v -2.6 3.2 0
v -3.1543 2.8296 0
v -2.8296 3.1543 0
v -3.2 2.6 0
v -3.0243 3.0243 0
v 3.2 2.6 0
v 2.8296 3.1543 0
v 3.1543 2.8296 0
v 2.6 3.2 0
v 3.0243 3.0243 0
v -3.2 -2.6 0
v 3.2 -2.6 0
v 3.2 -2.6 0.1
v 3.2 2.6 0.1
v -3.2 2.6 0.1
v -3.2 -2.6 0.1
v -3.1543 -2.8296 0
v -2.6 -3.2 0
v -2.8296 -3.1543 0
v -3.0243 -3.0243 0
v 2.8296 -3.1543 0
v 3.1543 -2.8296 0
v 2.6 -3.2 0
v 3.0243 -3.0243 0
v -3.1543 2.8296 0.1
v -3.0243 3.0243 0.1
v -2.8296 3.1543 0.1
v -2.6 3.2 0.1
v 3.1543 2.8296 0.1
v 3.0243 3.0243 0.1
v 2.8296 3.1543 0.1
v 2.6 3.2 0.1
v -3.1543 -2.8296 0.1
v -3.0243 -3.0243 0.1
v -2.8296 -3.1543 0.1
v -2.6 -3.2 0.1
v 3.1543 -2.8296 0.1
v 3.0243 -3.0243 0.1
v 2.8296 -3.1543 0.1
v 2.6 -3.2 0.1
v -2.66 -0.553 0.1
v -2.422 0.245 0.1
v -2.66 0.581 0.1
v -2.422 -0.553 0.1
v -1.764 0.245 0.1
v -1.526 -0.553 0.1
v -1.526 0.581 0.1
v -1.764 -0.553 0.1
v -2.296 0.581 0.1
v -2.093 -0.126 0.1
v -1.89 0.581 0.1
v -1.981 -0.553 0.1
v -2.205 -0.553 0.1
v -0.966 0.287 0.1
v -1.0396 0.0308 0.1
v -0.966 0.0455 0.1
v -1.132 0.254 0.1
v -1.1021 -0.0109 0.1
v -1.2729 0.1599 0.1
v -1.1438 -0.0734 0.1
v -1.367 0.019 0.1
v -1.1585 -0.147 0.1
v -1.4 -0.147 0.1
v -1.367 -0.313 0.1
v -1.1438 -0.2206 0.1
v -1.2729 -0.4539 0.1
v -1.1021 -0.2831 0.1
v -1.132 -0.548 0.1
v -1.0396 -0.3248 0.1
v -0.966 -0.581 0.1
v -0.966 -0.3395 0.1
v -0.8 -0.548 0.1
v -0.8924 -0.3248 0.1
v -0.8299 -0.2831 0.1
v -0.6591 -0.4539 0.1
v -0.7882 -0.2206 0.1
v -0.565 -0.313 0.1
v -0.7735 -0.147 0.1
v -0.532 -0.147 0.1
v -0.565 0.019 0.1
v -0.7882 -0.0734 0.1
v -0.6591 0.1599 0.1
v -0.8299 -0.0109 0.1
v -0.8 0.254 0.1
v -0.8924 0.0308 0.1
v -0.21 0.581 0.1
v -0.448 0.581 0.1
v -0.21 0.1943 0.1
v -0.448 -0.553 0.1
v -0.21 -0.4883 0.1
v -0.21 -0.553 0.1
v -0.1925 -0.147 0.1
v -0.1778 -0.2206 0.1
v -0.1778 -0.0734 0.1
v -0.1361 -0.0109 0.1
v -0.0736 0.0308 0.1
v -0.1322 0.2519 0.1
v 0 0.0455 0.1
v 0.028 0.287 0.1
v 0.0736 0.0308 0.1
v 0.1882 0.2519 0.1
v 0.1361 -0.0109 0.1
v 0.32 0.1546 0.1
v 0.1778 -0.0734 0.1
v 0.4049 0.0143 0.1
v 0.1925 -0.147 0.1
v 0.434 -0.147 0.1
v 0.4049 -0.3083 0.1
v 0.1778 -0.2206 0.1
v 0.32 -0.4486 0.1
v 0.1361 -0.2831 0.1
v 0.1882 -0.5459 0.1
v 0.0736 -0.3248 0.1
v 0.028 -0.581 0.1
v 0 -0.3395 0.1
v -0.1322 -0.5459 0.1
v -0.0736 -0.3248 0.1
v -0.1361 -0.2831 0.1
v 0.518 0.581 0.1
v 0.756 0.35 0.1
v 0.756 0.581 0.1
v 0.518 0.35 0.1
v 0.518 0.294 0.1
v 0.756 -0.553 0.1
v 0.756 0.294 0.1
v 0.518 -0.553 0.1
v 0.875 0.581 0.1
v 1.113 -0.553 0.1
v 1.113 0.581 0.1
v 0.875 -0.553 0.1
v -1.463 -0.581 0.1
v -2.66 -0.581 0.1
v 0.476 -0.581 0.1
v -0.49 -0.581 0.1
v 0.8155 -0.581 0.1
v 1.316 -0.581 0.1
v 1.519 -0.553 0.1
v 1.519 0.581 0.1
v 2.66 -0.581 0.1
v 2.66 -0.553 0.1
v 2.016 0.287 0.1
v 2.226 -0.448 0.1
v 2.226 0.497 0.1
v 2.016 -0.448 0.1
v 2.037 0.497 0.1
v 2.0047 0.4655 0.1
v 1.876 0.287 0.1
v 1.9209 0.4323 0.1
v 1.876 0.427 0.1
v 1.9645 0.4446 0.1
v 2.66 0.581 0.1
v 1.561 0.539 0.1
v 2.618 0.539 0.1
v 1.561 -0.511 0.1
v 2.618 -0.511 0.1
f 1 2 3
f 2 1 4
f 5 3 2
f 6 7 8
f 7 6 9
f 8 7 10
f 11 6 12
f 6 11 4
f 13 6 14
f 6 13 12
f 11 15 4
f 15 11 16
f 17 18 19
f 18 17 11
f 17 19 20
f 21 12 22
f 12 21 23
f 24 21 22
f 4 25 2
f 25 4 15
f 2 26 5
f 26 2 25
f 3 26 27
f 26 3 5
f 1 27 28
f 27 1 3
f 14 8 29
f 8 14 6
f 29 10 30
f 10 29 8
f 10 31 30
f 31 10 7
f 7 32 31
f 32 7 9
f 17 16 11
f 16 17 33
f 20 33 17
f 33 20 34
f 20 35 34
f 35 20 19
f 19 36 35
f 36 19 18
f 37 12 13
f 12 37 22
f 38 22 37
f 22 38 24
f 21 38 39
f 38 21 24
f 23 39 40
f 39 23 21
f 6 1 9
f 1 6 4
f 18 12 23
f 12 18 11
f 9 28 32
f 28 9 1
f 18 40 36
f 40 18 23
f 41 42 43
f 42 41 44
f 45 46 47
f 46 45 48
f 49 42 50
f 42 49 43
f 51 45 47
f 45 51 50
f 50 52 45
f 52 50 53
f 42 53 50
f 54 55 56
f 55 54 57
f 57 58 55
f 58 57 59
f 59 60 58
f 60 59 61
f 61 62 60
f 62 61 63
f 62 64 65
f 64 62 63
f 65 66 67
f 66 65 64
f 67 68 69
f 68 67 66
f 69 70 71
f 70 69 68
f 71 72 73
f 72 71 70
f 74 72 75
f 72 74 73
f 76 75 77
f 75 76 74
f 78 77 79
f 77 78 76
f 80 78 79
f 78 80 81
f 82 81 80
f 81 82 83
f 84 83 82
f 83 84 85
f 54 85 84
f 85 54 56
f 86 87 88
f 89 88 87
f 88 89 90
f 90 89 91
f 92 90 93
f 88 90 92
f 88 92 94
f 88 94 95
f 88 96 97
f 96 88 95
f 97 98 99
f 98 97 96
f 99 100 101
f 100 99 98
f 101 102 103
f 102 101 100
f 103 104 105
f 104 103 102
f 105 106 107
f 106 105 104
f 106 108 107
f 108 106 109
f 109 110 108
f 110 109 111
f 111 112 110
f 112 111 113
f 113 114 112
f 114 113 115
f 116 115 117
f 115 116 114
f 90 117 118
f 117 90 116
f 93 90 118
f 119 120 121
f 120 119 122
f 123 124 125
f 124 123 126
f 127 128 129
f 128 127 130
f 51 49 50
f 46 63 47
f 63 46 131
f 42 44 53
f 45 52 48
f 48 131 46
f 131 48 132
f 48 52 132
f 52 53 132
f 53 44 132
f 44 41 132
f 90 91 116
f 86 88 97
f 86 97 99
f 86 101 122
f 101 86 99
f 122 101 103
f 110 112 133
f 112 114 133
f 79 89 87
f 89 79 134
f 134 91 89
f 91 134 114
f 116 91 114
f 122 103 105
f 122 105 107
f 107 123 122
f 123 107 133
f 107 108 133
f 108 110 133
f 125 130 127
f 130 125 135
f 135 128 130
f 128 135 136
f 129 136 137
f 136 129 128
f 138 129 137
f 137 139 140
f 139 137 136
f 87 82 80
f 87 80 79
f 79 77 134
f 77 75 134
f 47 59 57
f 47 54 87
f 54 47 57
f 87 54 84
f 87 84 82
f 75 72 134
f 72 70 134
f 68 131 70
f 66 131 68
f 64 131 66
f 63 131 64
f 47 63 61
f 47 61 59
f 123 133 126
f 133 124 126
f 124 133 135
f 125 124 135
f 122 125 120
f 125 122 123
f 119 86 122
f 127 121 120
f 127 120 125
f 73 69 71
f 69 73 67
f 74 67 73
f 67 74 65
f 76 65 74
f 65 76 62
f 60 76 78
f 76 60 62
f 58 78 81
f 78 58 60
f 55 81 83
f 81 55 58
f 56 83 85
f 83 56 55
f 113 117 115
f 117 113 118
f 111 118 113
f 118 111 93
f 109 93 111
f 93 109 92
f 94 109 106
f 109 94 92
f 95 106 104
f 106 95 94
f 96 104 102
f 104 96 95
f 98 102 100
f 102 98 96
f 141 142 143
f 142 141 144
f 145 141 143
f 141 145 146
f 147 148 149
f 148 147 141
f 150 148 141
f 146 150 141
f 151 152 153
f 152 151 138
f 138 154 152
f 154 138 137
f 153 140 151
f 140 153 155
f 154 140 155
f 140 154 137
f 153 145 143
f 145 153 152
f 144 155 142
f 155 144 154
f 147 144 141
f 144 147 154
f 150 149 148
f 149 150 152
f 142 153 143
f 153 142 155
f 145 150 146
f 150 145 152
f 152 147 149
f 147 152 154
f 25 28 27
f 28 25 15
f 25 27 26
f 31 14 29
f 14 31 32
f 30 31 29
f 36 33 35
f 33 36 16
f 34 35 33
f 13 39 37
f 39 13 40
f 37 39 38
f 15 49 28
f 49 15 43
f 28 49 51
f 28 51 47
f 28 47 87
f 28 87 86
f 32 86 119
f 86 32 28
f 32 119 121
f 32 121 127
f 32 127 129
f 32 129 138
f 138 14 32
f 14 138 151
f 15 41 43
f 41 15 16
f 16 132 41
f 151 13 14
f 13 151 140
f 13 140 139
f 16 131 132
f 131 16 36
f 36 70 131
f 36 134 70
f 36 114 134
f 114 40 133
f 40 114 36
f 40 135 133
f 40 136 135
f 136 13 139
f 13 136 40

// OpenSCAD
// file: ../p/box3u12.scad
use <../lib.scad>
function ldraw_lib__box3u12() = [
// 0 Box with 3 Parallel Faces without Any Edges
// 0 Name: box3u12.dat
// 0 Author: J.C. Tchang [tchang]
// 0 !LDRAW_ORG Primitive UPDATE 2014-02
// 0 !LICENSE Licensed under CC BY 4.0 : see CAreadme.txt
// 
// 0 BFC CERTIFY CCW
  [0,"BFC","CERTIFY"],
  [0,"BFC","CCW"],
// 
// 0 !HISTORY 2014-12-23 [PTadmin] Official Update 2014-02
// 
// 
// 4 16 -1 1 1 1 1 1 1 1 -1 -1 1 -1
  [4,16,-1,1,1,1,1,1,1,1,-1,-1,1,-1],
// 4 16 -1 1 1 -1 0 1 1 0 1 1 1 1
  [4,16,-1,1,1,-1,0,1,1,0,1,1,1,1],
// 4 16 1 1 -1 1 0 -1 -1 0 -1 -1 1 -1
  [4,16,1,1,-1,1,0,-1,-1,0,-1,-1,1,-1],
];
module ldraw_lib__box3u12(step=0, col=false, unit=2/5, alt=false, line=0.2, solid=!$preview)
    makepoly(ldraw_lib__box3u12(), step=step, col=col, unit=unit, alt=alt, line=line, solid=solid);
ldraw_lib__box3u12(line=0.2);
// file: ../p/1-4cyli.scad
use <../lib.scad>
function ldraw_lib__1_4cyli() = [
// 0 Cylinder 0.25
// 0 Name: 1-4cyli.dat
// 0 Author: James Jessiman
// 0 !LDRAW_ORG Primitive UPDATE 2012-01
// 0 !LICENSE Licensed under CC BY 4.0 : see CAreadme.txt
// 
// 0 BFC CERTIFY CCW
  [0,"BFC","CERTIFY"],
  [0,"BFC","CCW"],
// 
// 0 !HISTORY 2002-03-23 [sbliss] Added BFC statement.
// 0 !HISTORY 2002-04-25 [PTadmin] Official Update 2002-02
// 0 !HISTORY 2007-06-22 [PTadmin] Header formatted for Contributor Agreement
// 0 !HISTORY 2008-07-01 [PTadmin] Official Update 2008-01
// 0 !HISTORY 2012-02-16 [Philo] Changed to CCW
// 0 !HISTORY 2012-03-30 [PTadmin] Official Update 2012-01
// 
// 
// 4 16 1 1 0 0.9239 1 0.3827 0.9239 0 0.3827 1 0 0
  [4,16,1,1,0,0.9239,1,0.3827,0.9239,0,0.3827,1,0,0],
// 5 24 1 0 0 1 1 0 0.9239 0 0.3827 1 0 -1
  [5,24,1,0,0,1,1,0,0.9239,0,0.3827,1,0,-1],
// 4 16 0.9239 1 0.3827 0.7071 1 0.7071 0.7071 0 0.7071 0.9239 0 0.3827
  [4,16,0.9239,1,0.3827,0.7071,1,0.7071,0.7071,0,0.7071,0.9239,0,0.3827],
// 5 24 0.9239 0 0.3827 0.9239 1 0.3827 0.7071 0 0.7071 1 0 0
  [5,24,0.9239,0,0.3827,0.9239,1,0.3827,0.7071,0,0.7071,1,0,0],
// 4 16 0.7071 1 0.7071 0.3827 1 0.9239 0.3827 0 0.9239 0.7071 0 0.7071
  [4,16,0.7071,1,0.7071,0.3827,1,0.9239,0.3827,0,0.9239,0.7071,0,0.7071],
// 5 24 0.7071 0 0.7071 0.7071 1 0.7071 0.3827 0 0.9239 0.9239 0 0.3827
  [5,24,0.7071,0,0.7071,0.7071,1,0.7071,0.3827,0,0.9239,0.9239,0,0.3827],
// 4 16 0.3827 1 0.9239 0 1 1 0 0 1 0.3827 0 0.9239
  [4,16,0.3827,1,0.9239,0,1,1,0,0,1,0.3827,0,0.9239],
// 5 24 0.3827 0 0.9239 0.3827 1 0.9239 0 0 1 0.7071 0 0.7071
  [5,24,0.3827,0,0.9239,0.3827,1,0.9239,0,0,1,0.7071,0,0.7071],
// 5 24 0 0 1 0 1 1 0.3827 0 0.9239 -1 0 1
  [5,24,0,0,1,0,1,1,0.3827,0,0.9239,-1,0,1],
];
module ldraw_lib__1_4cyli(step=0, col=false, unit=2/5, alt=false, line=0.2, solid=!$preview)
    makepoly(ldraw_lib__1_4cyli(), step=step, col=col, unit=unit, alt=alt, line=line, solid=solid);
ldraw_lib__1_4cyli(line=0.2);
// file: s/stickerback008x008.scad
use <../../lib.scad>
use <../../p/1-4chrd.scad>
use <../../p/1-4cyli.scad>
use <../../p/box3u12.scad>
function ldraw_lib__s__stickerback008x008() = [
// 0 ~Sticker Back  0.8 x  0.8
// 0 Name: s\stickerback008x008.dat
// 0 Author: Massimo Maso [Sirio]
// 0 !LDRAW_ORG Subpart UPDATE 2025-08
// 0 !LICENSE Licensed under CC BY 4.0 : see CAreadme.txt
// 
// 0 BFC CERTIFY CCW
  [0,"BFC","CERTIFY"],
  [0,"BFC","CCW"],
// 
// 0 !HISTORY 2025-08-31 [OrionP] Official Update 2025-08
// 
// 0 // Primitives
// 1 16 -6.5 0 6.5 -1.5 0 0 0 -1 0 0 0 1.5 1-4chrd.dat
  [1,16,-6.5,0,6.5,-1.5,0,0,0,-1,0,0,0,1.5, ldraw_lib__1_4chrd()],
// 1 16 6.5 0 6.5 1.5 0 0 0 -1 0 0 0 1.5 1-4chrd.dat
  [1,16,6.5,0,6.5,1.5,0,0,0,-1,0,0,0,1.5, ldraw_lib__1_4chrd()],
// 1 16 0 -.25 0 0 0 8 0 .25 0 6.5 0 0 box3u12.dat
  [1,16,0,-.25,0,0,0,8,0,.25,0,6.5,0,0, ldraw_lib__box3u12()],
// 1 16 -6.5 0 -6.5 -1.5 0 0 0 -1 0 0 0 -1.5 1-4chrd.dat
  [1,16,-6.5,0,-6.5,-1.5,0,0,0,-1,0,0,0,-1.5, ldraw_lib__1_4chrd()],
// 1 16 6.5 0 -6.5 1.5 0 0 0 -1 0 0 0 -1.5 1-4chrd.dat
  [1,16,6.5,0,-6.5,1.5,0,0,0,-1,0,0,0,-1.5, ldraw_lib__1_4chrd()],
// 1 16 -6.5 0 6.5 -1.5 0 0 0 -.25 0 0 0 1.5 1-4cyli.dat
  [1,16,-6.5,0,6.5,-1.5,0,0,0,-.25,0,0,0,1.5, ldraw_lib__1_4cyli()],
// 1 16 6.5 0 6.5 1.5 0 0 0 -.25 0 0 0 1.5 1-4cyli.dat
  [1,16,6.5,0,6.5,1.5,0,0,0,-.25,0,0,0,1.5, ldraw_lib__1_4cyli()],
// 1 16 -6.5 0 -6.5 -1.5 0 0 0 -.25 0 0 0 -1.5 1-4cyli.dat
  [1,16,-6.5,0,-6.5,-1.5,0,0,0,-.25,0,0,0,-1.5, ldraw_lib__1_4cyli()],
// 1 16 6.5 0 -6.5 1.5 0 0 0 -.25 0 0 0 -1.5 1-4cyli.dat
  [1,16,6.5,0,-6.5,1.5,0,0,0,-.25,0,0,0,-1.5, ldraw_lib__1_4cyli()],
// 0 // Bottom faces
// 4 16 -8 0 6.5 -6.5 0 8 6.5 0 8 8 0 6.5
  [4,16,-8,0,6.5,-6.5,0,8,6.5,0,8,8,0,6.5],
// 4 16 -8 0 -6.5 8 0 -6.5 6.5 0 -8 -6.5 0 -8
  [4,16,-8,0,-6.5,8,0,-6.5,6.5,0,-8,-6.5,0,-8],
// 0 // Lateral faces
// 4 16 -6.5 0 8 -6.5 -.25 8 6.5 -.25 8 6.5 0 8
  [4,16,-6.5,0,8,-6.5,-.25,8,6.5,-.25,8,6.5,0,8],
// 4 16 -6.5 0 -8 6.5 0 -8 6.5 -.25 -8 -6.5 -.25 -8
  [4,16,-6.5,0,-8,6.5,0,-8,6.5,-.25,-8,-6.5,-.25,-8],
];
module ldraw_lib__s__stickerback008x008(step=0, col=false, unit=2/5, alt=false, line=0.2, solid=!$preview)
    makepoly(ldraw_lib__s__stickerback008x008(), step=step, col=col, unit=unit, alt=alt, line=line, solid=solid);
ldraw_lib__s__stickerback008x008(line=0.2);
// file: ../p/logo-mobil1-text.scad
use <../lib.scad>
function ldraw_lib__logo_mobil1_text() = [
// 0 Logo Mobil without Number Monocolor
// 0 Name: logo-mobil1-text.dat
// 0 Author: Massimo Maso [Sirio]
// 0 !LDRAW_ORG Primitive UPDATE 2025-03
// 0 !LICENSE Licensed under CC BY 4.0 : see CAreadme.txt
// 
// 0 !HELP Exact dimensions X = 3.8; Z = 0.83
// 
// 0 BFC CERTIFY CCW
  [0,"BFC","CERTIFY"],
  [0,"BFC","CCW"],
// 
// 0 !HISTORY 2025-03-30 [OrionP] Official Update 2025-03
// 
// 0 // Text "Mobil1"
// 0 // Letter "M"
// 4 16 -1.73 0 .175 -1.9 0 .415 -1.9 0 -.395 -1.73 0 -.395
  [4,16,-1.73,0,.175,-1.9,0,.415,-1.9,0,-.395,-1.73,0,-.395],
// 4 16 -1.26 0 .175 -1.26 0 -.395 -1.09 0 -.395 -1.09 0 .415
  [4,16,-1.26,0,.175,-1.26,0,-.395,-1.09,0,-.395,-1.09,0,.415],
// 4 16 -1.73 0 .175 -1.495 0 -.09 -1.64 0 .415 -1.9 0 .415
  [4,16,-1.73,0,.175,-1.495,0,-.09,-1.64,0,.415,-1.9,0,.415],
// 4 16 -1.26 0 .175 -1.09 0 .415 -1.35 0 .415 -1.495 0 -.09
  [4,16,-1.26,0,.175,-1.09,0,.415,-1.35,0,.415,-1.495,0,-.09],
// 4 16 -1.415 0 -.395 -1.26 0 .175 -1.495 0 -.09 -1.575 0 -.395
  [4,16,-1.415,0,-.395,-1.26,0,.175,-1.495,0,-.09,-1.575,0,-.395],
// 3 16 -1.73 0 .175 -1.575 0 -.395 -1.495 0 -.09
  [3,16,-1.73,0,.175,-1.575,0,-.395,-1.495,0,-.09],
// 0 // Letter "o"
// 4 16 -.69 0 .0325 -.69 0 .205 -.8086 0 .1814 -.7426 0 .022
  [4,16,-.69,0,.0325,-.69,0,.205,-.8086,0,.1814,-.7426,0,.022],
// 4 16 -.7426 0 .022 -.8086 0 .1814 -.9092 0 .1142 -.7872 0 -.0078
  [4,16,-.7426,0,.022,-.8086,0,.1814,-.9092,0,.1142,-.7872,0,-.0078],
// 4 16 -.7872 0 -.0078 -.9092 0 .1142 -.9764 0 .0136 -.817 0 -.0524
  [4,16,-.7872,0,-.0078,-.9092,0,.1142,-.9764,0,.0136,-.817,0,-.0524],
// 4 16 -.817 0 -.0524 -.9764 0 .0136 -1 0 -.105 -.8275 0 -.105
  [4,16,-.817,0,-.0524,-.9764,0,.0136,-1,0,-.105,-.8275,0,-.105],
// 4 16 -.8275 0 -.105 -1 0 -.105 -.9764 0 -.2236 -.817 0 -.1576
  [4,16,-.8275,0,-.105,-1,0,-.105,-.9764,0,-.2236,-.817,0,-.1576],
// 4 16 -.817 0 -.1576 -.9764 0 -.2236 -.9092 0 -.3242 -.7872 0 -.2022
  [4,16,-.817,0,-.1576,-.9764,0,-.2236,-.9092,0,-.3242,-.7872,0,-.2022],
// 4 16 -.7872 0 -.2022 -.9092 0 -.3242 -.8086 0 -.3914 -.7426 0 -.232
  [4,16,-.7872,0,-.2022,-.9092,0,-.3242,-.8086,0,-.3914,-.7426,0,-.232],
// 4 16 -.7426 0 -.232 -.8086 0 -.3914 -.69 0 -.415 -.69 0 -.2425
  [4,16,-.7426,0,-.232,-.8086,0,-.3914,-.69,0,-.415,-.69,0,-.2425],
// 4 16 -.69 0 -.2425 -.69 0 -.415 -.5714 0 -.3914 -.6374 0 -.232
  [4,16,-.69,0,-.2425,-.69,0,-.415,-.5714,0,-.3914,-.6374,0,-.232],
// 4 16 -.6374 0 -.232 -.5714 0 -.3914 -.4708 0 -.3242 -.5928 0 -.2022
  [4,16,-.6374,0,-.232,-.5714,0,-.3914,-.4708,0,-.3242,-.5928,0,-.2022],
// 4 16 -.5928 0 -.2022 -.4708 0 -.3242 -.4036 0 -.2236 -.563 0 -.1576
  [4,16,-.5928,0,-.2022,-.4708,0,-.3242,-.4036,0,-.2236,-.563,0,-.1576],
// 4 16 -.563 0 -.1576 -.4036 0 -.2236 -.38 0 -.105 -.5525 0 -.105
  [4,16,-.563,0,-.1576,-.4036,0,-.2236,-.38,0,-.105,-.5525,0,-.105],
// 4 16 -.5525 0 -.105 -.38 0 -.105 -.4036 0 .0136 -.563 0 -.0524
  [4,16,-.5525,0,-.105,-.38,0,-.105,-.4036,0,.0136,-.563,0,-.0524],
// 4 16 -.563 0 -.0524 -.4036 0 .0136 -.4708 0 .1142 -.5928 0 -.0078
  [4,16,-.563,0,-.0524,-.4036,0,.0136,-.4708,0,.1142,-.5928,0,-.0078],
// 4 16 -.5928 0 -.0078 -.4708 0 .1142 -.5714 0 .1814 -.6374 0 .022
  [4,16,-.5928,0,-.0078,-.4708,0,.1142,-.5714,0,.1814,-.6374,0,.022],
// 4 16 -.6374 0 .022 -.5714 0 .1814 -.69 0 .205 -.69 0 .0325
  [4,16,-.6374,0,.022,-.5714,0,.1814,-.69,0,.205,-.69,0,.0325],
// 0 // Letter "b"
// 3 16 -.15 0 .415 -.32 0 .415 -.15 0 .1388
  [3,16,-.15,0,.415,-.32,0,.415,-.15,0,.1388],
// 4 16 -.32 0 .415 -.32 0 -.395 -.15 0 -.3488 -.15 0 .1388
  [4,16,-.32,0,.415,-.32,0,-.395,-.15,0,-.3488,-.15,0,.1388],
// 3 16 -.15 0 -.3488 -.32 0 -.395 -.15 0 -.395
  [3,16,-.15,0,-.3488,-.32,0,-.395,-.15,0,-.395],
// 3 16 -.1375 0 -.105 -.15 0 -.3488 -.127 0 -.1576
  [3,16,-.1375,0,-.105,-.15,0,-.3488,-.127,0,-.1576],
// 3 16 -.15 0 .1388 -.15 0 -.3488 -.1375 0 -.105
  [3,16,-.15,0,.1388,-.15,0,-.3488,-.1375,0,-.105],
// 3 16 -.15 0 .1388 -.1375 0 -.105 -.127 0 -.0524
  [3,16,-.15,0,.1388,-.1375,0,-.105,-.127,0,-.0524],
// 3 16 -.15 0 .1388 -.127 0 -.0524 -.0972 0 -.0078
  [3,16,-.15,0,.1388,-.127,0,-.0524,-.0972,0,-.0078],
// 4 16 -.15 0 .1388 -.0972 0 -.0078 -.0526 0 .022 -.0944 0 .1799
  [4,16,-.15,0,.1388,-.0972,0,-.0078,-.0526,0,.022,-.0944,0,.1799],
// 4 16 -.0944 0 .1799 -.0526 0 .022 0 0 .0325 .02 0 .205
  [4,16,-.0944,0,.1799,-.0526,0,.022,0,0,.0325,.02,0,.205],
// 4 16 .02 0 .205 0 0 .0325 .0526 0 .022 .1344 0 .1799
  [4,16,.02,0,.205,0,0,.0325,.0526,0,.022,.1344,0,.1799],
// 4 16 .1344 0 .1799 .0526 0 .022 .0972 0 -.0078 .2286 0 .1104
  [4,16,.1344,0,.1799,.0526,0,.022,.0972,0,-.0078,.2286,0,.1104],
// 4 16 .2286 0 .1104 .0972 0 -.0078 .127 0 -.0524 .2892 0 .0102
  [4,16,.2286,0,.1104,.0972,0,-.0078,.127,0,-.0524,.2892,0,.0102],
// 4 16 .2892 0 .0102 .127 0 -.0524 .1375 0 -.105 .31 0 -.105
  [4,16,.2892,0,.0102,.127,0,-.0524,.1375,0,-.105,.31,0,-.105],
// 4 16 .31 0 -.105 .1375 0 -.105 .127 0 -.1576 .2892 0 -.2202
  [4,16,.31,0,-.105,.1375,0,-.105,.127,0,-.1576,.2892,0,-.2202],
// 4 16 .2892 0 -.2202 .127 0 -.1576 .0972 0 -.2022 .2286 0 -.3204
  [4,16,.2892,0,-.2202,.127,0,-.1576,.0972,0,-.2022,.2286,0,-.3204],
// 4 16 .2286 0 -.3204 .0972 0 -.2022 .0526 0 -.232 .1344 0 -.3899
  [4,16,.2286,0,-.3204,.0972,0,-.2022,.0526,0,-.232,.1344,0,-.3899],
// 4 16 .1344 0 -.3899 .0526 0 -.232 0 0 -.2425 .02 0 -.415
  [4,16,.1344,0,-.3899,.0526,0,-.232,0,0,-.2425,.02,0,-.415],
// 4 16 .02 0 -.415 0 0 -.2425 -.0526 0 -.232 -.0944 0 -.3899
  [4,16,.02,0,-.415,0,0,-.2425,-.0526,0,-.232,-.0944,0,-.3899],
// 4 16 -.0944 0 -.3899 -.0526 0 -.232 -.0972 0 -.2022 -.15 0 -.3488
  [4,16,-.0944,0,-.3899,-.0526,0,-.232,-.0972,0,-.2022,-.15,0,-.3488],
// 3 16 -.127 0 -.1576 -.15 0 -.3488 -.0972 0 -.2022
  [3,16,-.127,0,-.1576,-.15,0,-.3488,-.0972,0,-.2022],
// 0 // Letter "i"
// 4 16 .37 0 .415 .37 0 .25 .54 0 .25 .54 0 .415
  [4,16,.37,0,.415,.37,0,.25,.54,0,.25,.54,0,.415],
// 4 16 .37 0 .21 .37 0 -.395 .54 0 -.395 .54 0 .21
  [4,16,.37,0,.21,.37,0,-.395,.54,0,-.395,.54,0,.21],
// 0 // Letter "l"
// 4 16 .625 0 .415 .625 0 -.395 .795 0 -.395 .795 0 .415
  [4,16,.625,0,.415,.625,0,-.395,.795,0,-.395,.795,0,.415],
];
module ldraw_lib__logo_mobil1_text(step=0, col=false, unit=2/5, alt=false, line=0.2, solid=!$preview)
    makepoly(ldraw_lib__logo_mobil1_text(), step=step, col=col, unit=unit, alt=alt, line=line, solid=solid);
ldraw_lib__logo_mobil1_text(line=0.2);
// file: ../p/logo-mobil1-number.scad
use <../lib.scad>
function ldraw_lib__logo_mobil1_number() = [
// 0 Logo Mobil -  1 and Frame Monocolor
// 0 Name: logo-mobil1-number.dat
// 0 Author: Massimo Maso [Sirio]
// 0 !LDRAW_ORG Primitive UPDATE 2025-03
// 0 !LICENSE Licensed under CC BY 4.0 : see CAreadme.txt
// 
// 0 !HELP Exact dimensions X = 3.8; Z = 0.83
// 
// 0 BFC CERTIFY CCW
  [0,"BFC","CERTIFY"],
  [0,"BFC","CCW"],
// 
// 0 !HISTORY 2025-03-30 [OrionP] Official Update 2025-03
// 
// 0 // Number "1"
// 4 16 1.44 0 .205 1.44 0 -.32 1.59 0 -.32 1.59 0 .355
  [4,16,1.44,0,.205,1.44,0,-.32,1.59,0,-.32,1.59,0,.355],
// 4 16 1.44 0 .205 1.59 0 .355 1.455 0 .355 1.4319 0 .3325
  [4,16,1.44,0,.205,1.59,0,.355,1.455,0,.355,1.4319,0,.3325],
// 4 16 1.3721 0 .3088 1.34 0 .305 1.34 0 .205 1.44 0 .205
  [4,16,1.3721,0,.3088,1.34,0,.305,1.34,0,.205,1.44,0,.205],
// 3 16 1.4032 0 .3176 1.3721 0 .3088 1.44 0 .205
  [3,16,1.4032,0,.3176,1.3721,0,.3088,1.44,0,.205],
// 3 16 1.4319 0 .3325 1.4032 0 .3176 1.44 0 .205
  [3,16,1.4319,0,.3325,1.4032,0,.3176,1.44,0,.205],
// 0 // Frame
// 4 16 1.085 0 .415 1.115 0 .385 1.87 0 .385 1.9 0 .415
  [4,16,1.085,0,.415,1.115,0,.385,1.87,0,.385,1.9,0,.415],
// 4 16 1.085 0 .415 1.085 0 -.395 1.115 0 -.365 1.115 0 .385
  [4,16,1.085,0,.415,1.085,0,-.395,1.115,0,-.365,1.115,0,.385],
// 4 16 1.9 0 -.395 1.9 0 .415 1.87 0 .385 1.87 0 -.365
  [4,16,1.9,0,-.395,1.9,0,.415,1.87,0,.385,1.87,0,-.365],
// 4 16 1.9 0 -.395 1.87 0 -.365 1.115 0 -.365 1.085 0 -.395
  [4,16,1.9,0,-.395,1.87,0,-.365,1.115,0,-.365,1.085,0,-.395],
];
module ldraw_lib__logo_mobil1_number(step=0, col=false, unit=2/5, alt=false, line=0.2, solid=!$preview)
    makepoly(ldraw_lib__logo_mobil1_number(), step=step, col=col, unit=unit, alt=alt, line=line, solid=solid);
ldraw_lib__logo_mobil1_number(line=0.2);
// file: ../p/logo-mobil1-number-box.scad
use <../lib.scad>
function ldraw_lib__logo_mobil1_number_box() = [
// 0 Logo Mobil Box for Number  1
// 0 Name: logo-mobil1-number-box.dat
// 0 Author: Massimo Maso [Sirio]
// 0 !LDRAW_ORG Primitive UPDATE 2025-03
// 0 !LICENSE Licensed under CC BY 4.0 : see CAreadme.txt
// 
// 0 !HELP Exact dimensions X = 3.8; Z = 0.83
// 
// 0 BFC CERTIFY CCW
  [0,"BFC","CERTIFY"],
  [0,"BFC","CCW"],
// 
// 0 !HISTORY 2025-03-30 [OrionP] Official Update 2025-03
// 
// 0 // Inner rectangle
// 4 16 1.87 0 .385 1.115 0 .385 1.455 0 .355 1.59 0 .355
  [4,16,1.87,0,.385,1.115,0,.385,1.455,0,.355,1.59,0,.355],
// 4 16 1.44 0 -.32 1.115 0 -.365 1.87 0 -.365 1.59 0 -.32
  [4,16,1.44,0,-.32,1.115,0,-.365,1.87,0,-.365,1.59,0,-.32],
// 4 16 1.44 0 -.32 1.44 0 .205 1.34 0 .205 1.115 0 -.365
  [4,16,1.44,0,-.32,1.44,0,.205,1.34,0,.205,1.115,0,-.365],
// 4 16 1.115 0 .385 1.34 0 .305 1.3721 0 .3088 1.4032 0 .3176
  [4,16,1.115,0,.385,1.34,0,.305,1.3721,0,.3088,1.4032,0,.3176],
// 4 16 1.87 0 .385 1.59 0 .355 1.59 0 -.32 1.87 0 -.365
  [4,16,1.87,0,.385,1.59,0,.355,1.59,0,-.32,1.87,0,-.365],
// 4 16 1.115 0 .385 1.4032 0 .3176 1.4319 0 .3325 1.455 0 .355
  [4,16,1.115,0,.385,1.4032,0,.3176,1.4319,0,.3325,1.455,0,.355],
// 4 16 1.34 0 .205 1.34 0 .305 1.115 0 .385 1.115 0 -.365
  [4,16,1.34,0,.205,1.34,0,.305,1.115,0,.385,1.115,0,-.365],
];
module ldraw_lib__logo_mobil1_number_box(step=0, col=false, unit=2/5, alt=false, line=0.2, solid=!$preview)
    makepoly(ldraw_lib__logo_mobil1_number_box(), step=step, col=col, unit=unit, alt=alt, line=line, solid=solid);
ldraw_lib__logo_mobil1_number_box(line=0.2);
// file: ../p/1-4chrd.scad
use <../lib.scad>
function ldraw_lib__1_4chrd() = [
// 0 Chord 0.25
// 0 Name: 1-4chrd.dat
// 0 Author: Max Martin Richter [MMR1988]
// 0 !LDRAW_ORG Primitive UPDATE 2023-05
// 0 !LICENSE Licensed under CC BY 4.0 : see CAreadme.txt
// 
// 0 BFC CERTIFY CCW
  [0,"BFC","CERTIFY"],
  [0,"BFC","CCW"],
// 
// 0 !HISTORY 2004-04-22 [PTadmin] Official Update 2004-02
// 0 !HISTORY 2007-10-09 [PTadmin] Header formatted for Contributor Agreement
// 0 !HISTORY 2008-07-01 [PTadmin] Official Update 2008-01
// 0 !HISTORY 2012-08-02 [MMR1988] Re-creation with PrimGen2 and Rectifier
// 0 !HISTORY 2012-08-09 [PTadmin] Official Update 2012-02
// 0 !HISTORY 2023-10-27 [OrionP] Change author to MMR1988 from hafhead
// 0 !HISTORY 2023-10-31 [OrionP] Official Update 2023-05
// 
// 4 16 0.9239 0 0.3827 0.3827 0 0.9239 0 0 1 1 0 0
  [4,16,0.9239,0,0.3827,0.3827,0,0.9239,0,0,1,1,0,0],
// 3 16 0.7071 0 0.7071 0.3827 0 0.9239 0.9239 0 0.3827
  [3,16,0.7071,0,0.7071,0.3827,0,0.9239,0.9239,0,0.3827],
];
module ldraw_lib__1_4chrd(step=0, col=false, unit=2/5, alt=false, line=0.2, solid=!$preview)
    makepoly(ldraw_lib__1_4chrd(), step=step, col=col, unit=unit, alt=alt, line=line, solid=solid);
ldraw_lib__1_4chrd(line=0.2);
// main file
use <../lib.scad>
use <../p/1-4chrd.scad>
use <../p/logo-mobil1-number-box.scad>
use <../p/logo-mobil1-number.scad>
use <../p/logo-mobil1-text-box.scad>
use <../p/logo-mobil1-text.scad>
use <s/stickerback008x008.scad>
function ldraw_lib__6148328bj() = [
// 0 Sticker  0.8 x  0.8 with White Mobil 1 Logo on Black Background
// 0 Name: 6148328bj.dat
// 0 Author: Massimo Maso [Sirio]
// 0 !LDRAW_ORG Part UPDATE 2026-09
// 0 !LICENSE Licensed under CC BY 4.0 : see CAreadme.txt
// 
// 0 BFC CERTIFY CCW
  [0,"BFC","CERTIFY"],
  [0,"BFC","CCW"],
// 
// 0 !CATEGORY Sticker
// 0 !KEYWORDS 919, Bricklink 75876stk01, Brickowl 333459, Hybrid, Pit Lane
// 0 !KEYWORDS Porsche, Rebrickable 26357, set 75876, Speed Champions
// 
// 0 !HISTORY 2025-03-30 [OrionP] Official Update 2025-03
// 0 !HISTORY 2026-05-27 [MagFors] Update description
// 0 !HISTORY 2026-05-29 [KnightOfTarenta] Added Stickerback
// 0 !HISTORY 2026-09-30 [OrionP] Official Update 2026-09
// 
// 0 // Sticker Back
// 1 16 0 0 0 1 0 0 0 1 0 0 0 1 s\stickerback008x008.dat
  [1,16,0,0,0,1,0,0,0,1,0,0,0,1, ldraw_lib__s__stickerback008x008()],
// 
// 0 // Logo primitive
// 1 15 0 -.25 0 3.5 0 0 0 1 0 0 0 3.5 logo-mobil1-text.dat
  [1,15,0,-.25,0,3.5,0,0,0,1,0,0,0,3.5, ldraw_lib__logo_mobil1_text()],
// 1 0 0 -.25 0 3.5 0 0 0 1 0 0 0 3.5 logo-mobil1-text-box.dat
  [1,0,0,-.25,0,3.5,0,0,0,1,0,0,0,3.5, ldraw_lib__logo_mobil1_text_box()],
// 1 15 0 -.25 0 3.5 0 0 0 1 0 0 0 3.5 logo-mobil1-number.dat
  [1,15,0,-.25,0,3.5,0,0,0,1,0,0,0,3.5, ldraw_lib__logo_mobil1_number()],
// 1 0 0 -.25 0 3.5 0 0 0 1 0 0 0 3.5 logo-mobil1-number-box.dat
  [1,0,0,-.25,0,3.5,0,0,0,1,0,0,0,3.5, ldraw_lib__logo_mobil1_number_box()],
// 0 // Primitives
// 1 0 -6.5 -.25 6.5 -1.5 0 0 0 1 0 0 0 1.5 1-4chrd.dat
  [1,0,-6.5,-.25,6.5,-1.5,0,0,0,1,0,0,0,1.5, ldraw_lib__1_4chrd()],
// 1 0 6.5 -.25 6.5 1.5 0 0 0 1 0 0 0 1.5 1-4chrd.dat
  [1,0,6.5,-.25,6.5,1.5,0,0,0,1,0,0,0,1.5, ldraw_lib__1_4chrd()],
// 1 0 -6.5 -.25 -6.5 -1.5 0 0 0 1 0 0 0 -1.5 1-4chrd.dat
  [1,0,-6.5,-.25,-6.5,-1.5,0,0,0,1,0,0,0,-1.5, ldraw_lib__1_4chrd()],
// 1 0 6.5 -.25 -6.5 1.5 0 0 0 1 0 0 0 -1.5 1-4chrd.dat
  [1,0,6.5,-.25,-6.5,1.5,0,0,0,1,0,0,0,-1.5, ldraw_lib__1_4chrd()],
// 0 // Top faces
// 4 0 -6.5 -.25 8 -8 -.25 6.5 -6.65 -.25 1.4525 -5.74 -.25 1.4525
  [4,0,-6.5,-.25,8,-8,-.25,6.5,-6.65,-.25,1.4525,-5.74,-.25,1.4525],
// 3 0 -6.5 -.25 8 -5.74 -.25 1.4525 -4.725 -.25 1.4525
  [3,0,-6.5,-.25,8,-5.74,-.25,1.4525,-4.725,-.25,1.4525],
// 3 0 -6.5 -.25 8 -4.725 -.25 1.4525 -3.815 -.25 1.4525
  [3,0,-6.5,-.25,8,-4.725,-.25,1.4525,-3.815,-.25,1.4525],
// 3 0 -6.5 -.25 8 -3.815 -.25 1.4525 -1.12 -.25 1.4525
  [3,0,-6.5,-.25,8,-3.815,-.25,1.4525,-1.12,-.25,1.4525],
// 3 0 -6.5 -.25 8 -1.12 -.25 1.4525 -.525 -.25 1.4525
  [3,0,-6.5,-.25,8,-1.12,-.25,1.4525,-.525,-.25,1.4525],
// 4 0 -6.5 -.25 8 -.525 -.25 1.4525 1.295 -.25 1.4525 6.5 -.25 8
  [4,0,-6.5,-.25,8,-.525,-.25,1.4525,1.295,-.25,1.4525,6.5,-.25,8],
// 3 0 6.5 -.25 8 1.295 -.25 1.4525 1.89 -.25 1.4525
  [3,0,6.5,-.25,8,1.295,-.25,1.4525,1.89,-.25,1.4525],
// 3 0 6.5 -.25 8 1.89 -.25 1.4525 2.1875 -.25 1.4525
  [3,0,6.5,-.25,8,1.89,-.25,1.4525,2.1875,-.25,1.4525],
// 3 0 6.5 -.25 8 2.1875 -.25 1.4525 2.7825 -.25 1.4525
  [3,0,6.5,-.25,8,2.1875,-.25,1.4525,2.7825,-.25,1.4525],
// 3 0 6.5 -.25 8 2.7825 -.25 1.4525 3.7975 -.25 1.4525
  [3,0,6.5,-.25,8,2.7825,-.25,1.4525,3.7975,-.25,1.4525],
// 4 0 6.5 -.25 8 3.7975 -.25 1.4525 6.65 -.25 1.4525 8 -.25 6.5
  [4,0,6.5,-.25,8,3.7975,-.25,1.4525,6.65,-.25,1.4525,8,-.25,6.5],
// 4 0 -8 -.25 -6.5 -6.65 -.25 -1.3825 -6.65 -.25 1.4525 -8 -.25 6.5
  [4,0,-8,-.25,-6.5,-6.65,-.25,-1.3825,-6.65,-.25,1.4525,-8,-.25,6.5],
// 3 0 -8 -.25 -6.5 -6.65 -.25 -1.4525 -6.65 -.25 -1.3825
  [3,0,-8,-.25,-6.5,-6.65,-.25,-1.4525,-6.65,-.25,-1.3825],
// 4 0 8 -.25 -6.5 8 -.25 6.5 6.65 -.25 1.4525 6.65 -.25 -1.3825
  [4,0,8,-.25,-6.5,8,-.25,6.5,6.65,-.25,1.4525,6.65,-.25,-1.3825],
// 3 0 8 -.25 -6.5 6.65 -.25 -1.3825 6.65 -.25 -1.4525
  [3,0,8,-.25,-6.5,6.65,-.25,-1.3825,6.65,-.25,-1.4525],
// 4 0 -6.5 -.25 -8 -3.6575 -.25 -1.4525 -6.65 -.25 -1.4525 -8 -.25 -6.5
  [4,0,-6.5,-.25,-8,-3.6575,-.25,-1.4525,-6.65,-.25,-1.4525,-8,-.25,-6.5],
// 3 0 -6.5 -.25 -8 -2.415 -.25 -1.4525 -3.6575 -.25 -1.4525
  [3,0,-6.5,-.25,-8,-2.415,-.25,-1.4525,-3.6575,-.25,-1.4525],
// 3 0 -6.5 -.25 -8 -1.225 -.25 -1.4525 -2.415 -.25 -1.4525
  [3,0,-6.5,-.25,-8,-1.225,-.25,-1.4525,-2.415,-.25,-1.4525],
// 3 0 -6.5 -.25 -8 .07 -.25 -1.4525 -1.225 -.25 -1.4525
  [3,0,-6.5,-.25,-8,.07,-.25,-1.4525,-1.225,-.25,-1.4525],
// 4 0 -6.5 -.25 -8 6.5 -.25 -8 1.19 -.25 -1.4525 .07 -.25 -1.4525
  [4,0,-6.5,-.25,-8,6.5,-.25,-8,1.19,-.25,-1.4525,.07,-.25,-1.4525],
// 3 0 6.5 -.25 -8 2.03875 -.25 -1.4525 1.19 -.25 -1.4525
  [3,0,6.5,-.25,-8,2.03875,-.25,-1.4525,1.19,-.25,-1.4525],
// 3 0 6.5 -.25 -8 3.29 -.25 -1.4525 2.03875 -.25 -1.4525
  [3,0,6.5,-.25,-8,3.29,-.25,-1.4525,2.03875,-.25,-1.4525],
// 4 0 6.5 -.25 -8 8 -.25 -6.5 6.65 -.25 -1.4525 3.29 -.25 -1.4525
  [4,0,6.5,-.25,-8,8,-.25,-6.5,6.65,-.25,-1.4525,3.29,-.25,-1.4525],
];
module ldraw_lib__6148328bj(step=0, col=false, unit=2/5, alt=false, line=0.2, solid=!$preview)
    makepoly(ldraw_lib__6148328bj(), step=step, col=col, unit=unit, alt=alt, line=line, solid=solid);
ldraw_lib__6148328bj(line=0.2);
